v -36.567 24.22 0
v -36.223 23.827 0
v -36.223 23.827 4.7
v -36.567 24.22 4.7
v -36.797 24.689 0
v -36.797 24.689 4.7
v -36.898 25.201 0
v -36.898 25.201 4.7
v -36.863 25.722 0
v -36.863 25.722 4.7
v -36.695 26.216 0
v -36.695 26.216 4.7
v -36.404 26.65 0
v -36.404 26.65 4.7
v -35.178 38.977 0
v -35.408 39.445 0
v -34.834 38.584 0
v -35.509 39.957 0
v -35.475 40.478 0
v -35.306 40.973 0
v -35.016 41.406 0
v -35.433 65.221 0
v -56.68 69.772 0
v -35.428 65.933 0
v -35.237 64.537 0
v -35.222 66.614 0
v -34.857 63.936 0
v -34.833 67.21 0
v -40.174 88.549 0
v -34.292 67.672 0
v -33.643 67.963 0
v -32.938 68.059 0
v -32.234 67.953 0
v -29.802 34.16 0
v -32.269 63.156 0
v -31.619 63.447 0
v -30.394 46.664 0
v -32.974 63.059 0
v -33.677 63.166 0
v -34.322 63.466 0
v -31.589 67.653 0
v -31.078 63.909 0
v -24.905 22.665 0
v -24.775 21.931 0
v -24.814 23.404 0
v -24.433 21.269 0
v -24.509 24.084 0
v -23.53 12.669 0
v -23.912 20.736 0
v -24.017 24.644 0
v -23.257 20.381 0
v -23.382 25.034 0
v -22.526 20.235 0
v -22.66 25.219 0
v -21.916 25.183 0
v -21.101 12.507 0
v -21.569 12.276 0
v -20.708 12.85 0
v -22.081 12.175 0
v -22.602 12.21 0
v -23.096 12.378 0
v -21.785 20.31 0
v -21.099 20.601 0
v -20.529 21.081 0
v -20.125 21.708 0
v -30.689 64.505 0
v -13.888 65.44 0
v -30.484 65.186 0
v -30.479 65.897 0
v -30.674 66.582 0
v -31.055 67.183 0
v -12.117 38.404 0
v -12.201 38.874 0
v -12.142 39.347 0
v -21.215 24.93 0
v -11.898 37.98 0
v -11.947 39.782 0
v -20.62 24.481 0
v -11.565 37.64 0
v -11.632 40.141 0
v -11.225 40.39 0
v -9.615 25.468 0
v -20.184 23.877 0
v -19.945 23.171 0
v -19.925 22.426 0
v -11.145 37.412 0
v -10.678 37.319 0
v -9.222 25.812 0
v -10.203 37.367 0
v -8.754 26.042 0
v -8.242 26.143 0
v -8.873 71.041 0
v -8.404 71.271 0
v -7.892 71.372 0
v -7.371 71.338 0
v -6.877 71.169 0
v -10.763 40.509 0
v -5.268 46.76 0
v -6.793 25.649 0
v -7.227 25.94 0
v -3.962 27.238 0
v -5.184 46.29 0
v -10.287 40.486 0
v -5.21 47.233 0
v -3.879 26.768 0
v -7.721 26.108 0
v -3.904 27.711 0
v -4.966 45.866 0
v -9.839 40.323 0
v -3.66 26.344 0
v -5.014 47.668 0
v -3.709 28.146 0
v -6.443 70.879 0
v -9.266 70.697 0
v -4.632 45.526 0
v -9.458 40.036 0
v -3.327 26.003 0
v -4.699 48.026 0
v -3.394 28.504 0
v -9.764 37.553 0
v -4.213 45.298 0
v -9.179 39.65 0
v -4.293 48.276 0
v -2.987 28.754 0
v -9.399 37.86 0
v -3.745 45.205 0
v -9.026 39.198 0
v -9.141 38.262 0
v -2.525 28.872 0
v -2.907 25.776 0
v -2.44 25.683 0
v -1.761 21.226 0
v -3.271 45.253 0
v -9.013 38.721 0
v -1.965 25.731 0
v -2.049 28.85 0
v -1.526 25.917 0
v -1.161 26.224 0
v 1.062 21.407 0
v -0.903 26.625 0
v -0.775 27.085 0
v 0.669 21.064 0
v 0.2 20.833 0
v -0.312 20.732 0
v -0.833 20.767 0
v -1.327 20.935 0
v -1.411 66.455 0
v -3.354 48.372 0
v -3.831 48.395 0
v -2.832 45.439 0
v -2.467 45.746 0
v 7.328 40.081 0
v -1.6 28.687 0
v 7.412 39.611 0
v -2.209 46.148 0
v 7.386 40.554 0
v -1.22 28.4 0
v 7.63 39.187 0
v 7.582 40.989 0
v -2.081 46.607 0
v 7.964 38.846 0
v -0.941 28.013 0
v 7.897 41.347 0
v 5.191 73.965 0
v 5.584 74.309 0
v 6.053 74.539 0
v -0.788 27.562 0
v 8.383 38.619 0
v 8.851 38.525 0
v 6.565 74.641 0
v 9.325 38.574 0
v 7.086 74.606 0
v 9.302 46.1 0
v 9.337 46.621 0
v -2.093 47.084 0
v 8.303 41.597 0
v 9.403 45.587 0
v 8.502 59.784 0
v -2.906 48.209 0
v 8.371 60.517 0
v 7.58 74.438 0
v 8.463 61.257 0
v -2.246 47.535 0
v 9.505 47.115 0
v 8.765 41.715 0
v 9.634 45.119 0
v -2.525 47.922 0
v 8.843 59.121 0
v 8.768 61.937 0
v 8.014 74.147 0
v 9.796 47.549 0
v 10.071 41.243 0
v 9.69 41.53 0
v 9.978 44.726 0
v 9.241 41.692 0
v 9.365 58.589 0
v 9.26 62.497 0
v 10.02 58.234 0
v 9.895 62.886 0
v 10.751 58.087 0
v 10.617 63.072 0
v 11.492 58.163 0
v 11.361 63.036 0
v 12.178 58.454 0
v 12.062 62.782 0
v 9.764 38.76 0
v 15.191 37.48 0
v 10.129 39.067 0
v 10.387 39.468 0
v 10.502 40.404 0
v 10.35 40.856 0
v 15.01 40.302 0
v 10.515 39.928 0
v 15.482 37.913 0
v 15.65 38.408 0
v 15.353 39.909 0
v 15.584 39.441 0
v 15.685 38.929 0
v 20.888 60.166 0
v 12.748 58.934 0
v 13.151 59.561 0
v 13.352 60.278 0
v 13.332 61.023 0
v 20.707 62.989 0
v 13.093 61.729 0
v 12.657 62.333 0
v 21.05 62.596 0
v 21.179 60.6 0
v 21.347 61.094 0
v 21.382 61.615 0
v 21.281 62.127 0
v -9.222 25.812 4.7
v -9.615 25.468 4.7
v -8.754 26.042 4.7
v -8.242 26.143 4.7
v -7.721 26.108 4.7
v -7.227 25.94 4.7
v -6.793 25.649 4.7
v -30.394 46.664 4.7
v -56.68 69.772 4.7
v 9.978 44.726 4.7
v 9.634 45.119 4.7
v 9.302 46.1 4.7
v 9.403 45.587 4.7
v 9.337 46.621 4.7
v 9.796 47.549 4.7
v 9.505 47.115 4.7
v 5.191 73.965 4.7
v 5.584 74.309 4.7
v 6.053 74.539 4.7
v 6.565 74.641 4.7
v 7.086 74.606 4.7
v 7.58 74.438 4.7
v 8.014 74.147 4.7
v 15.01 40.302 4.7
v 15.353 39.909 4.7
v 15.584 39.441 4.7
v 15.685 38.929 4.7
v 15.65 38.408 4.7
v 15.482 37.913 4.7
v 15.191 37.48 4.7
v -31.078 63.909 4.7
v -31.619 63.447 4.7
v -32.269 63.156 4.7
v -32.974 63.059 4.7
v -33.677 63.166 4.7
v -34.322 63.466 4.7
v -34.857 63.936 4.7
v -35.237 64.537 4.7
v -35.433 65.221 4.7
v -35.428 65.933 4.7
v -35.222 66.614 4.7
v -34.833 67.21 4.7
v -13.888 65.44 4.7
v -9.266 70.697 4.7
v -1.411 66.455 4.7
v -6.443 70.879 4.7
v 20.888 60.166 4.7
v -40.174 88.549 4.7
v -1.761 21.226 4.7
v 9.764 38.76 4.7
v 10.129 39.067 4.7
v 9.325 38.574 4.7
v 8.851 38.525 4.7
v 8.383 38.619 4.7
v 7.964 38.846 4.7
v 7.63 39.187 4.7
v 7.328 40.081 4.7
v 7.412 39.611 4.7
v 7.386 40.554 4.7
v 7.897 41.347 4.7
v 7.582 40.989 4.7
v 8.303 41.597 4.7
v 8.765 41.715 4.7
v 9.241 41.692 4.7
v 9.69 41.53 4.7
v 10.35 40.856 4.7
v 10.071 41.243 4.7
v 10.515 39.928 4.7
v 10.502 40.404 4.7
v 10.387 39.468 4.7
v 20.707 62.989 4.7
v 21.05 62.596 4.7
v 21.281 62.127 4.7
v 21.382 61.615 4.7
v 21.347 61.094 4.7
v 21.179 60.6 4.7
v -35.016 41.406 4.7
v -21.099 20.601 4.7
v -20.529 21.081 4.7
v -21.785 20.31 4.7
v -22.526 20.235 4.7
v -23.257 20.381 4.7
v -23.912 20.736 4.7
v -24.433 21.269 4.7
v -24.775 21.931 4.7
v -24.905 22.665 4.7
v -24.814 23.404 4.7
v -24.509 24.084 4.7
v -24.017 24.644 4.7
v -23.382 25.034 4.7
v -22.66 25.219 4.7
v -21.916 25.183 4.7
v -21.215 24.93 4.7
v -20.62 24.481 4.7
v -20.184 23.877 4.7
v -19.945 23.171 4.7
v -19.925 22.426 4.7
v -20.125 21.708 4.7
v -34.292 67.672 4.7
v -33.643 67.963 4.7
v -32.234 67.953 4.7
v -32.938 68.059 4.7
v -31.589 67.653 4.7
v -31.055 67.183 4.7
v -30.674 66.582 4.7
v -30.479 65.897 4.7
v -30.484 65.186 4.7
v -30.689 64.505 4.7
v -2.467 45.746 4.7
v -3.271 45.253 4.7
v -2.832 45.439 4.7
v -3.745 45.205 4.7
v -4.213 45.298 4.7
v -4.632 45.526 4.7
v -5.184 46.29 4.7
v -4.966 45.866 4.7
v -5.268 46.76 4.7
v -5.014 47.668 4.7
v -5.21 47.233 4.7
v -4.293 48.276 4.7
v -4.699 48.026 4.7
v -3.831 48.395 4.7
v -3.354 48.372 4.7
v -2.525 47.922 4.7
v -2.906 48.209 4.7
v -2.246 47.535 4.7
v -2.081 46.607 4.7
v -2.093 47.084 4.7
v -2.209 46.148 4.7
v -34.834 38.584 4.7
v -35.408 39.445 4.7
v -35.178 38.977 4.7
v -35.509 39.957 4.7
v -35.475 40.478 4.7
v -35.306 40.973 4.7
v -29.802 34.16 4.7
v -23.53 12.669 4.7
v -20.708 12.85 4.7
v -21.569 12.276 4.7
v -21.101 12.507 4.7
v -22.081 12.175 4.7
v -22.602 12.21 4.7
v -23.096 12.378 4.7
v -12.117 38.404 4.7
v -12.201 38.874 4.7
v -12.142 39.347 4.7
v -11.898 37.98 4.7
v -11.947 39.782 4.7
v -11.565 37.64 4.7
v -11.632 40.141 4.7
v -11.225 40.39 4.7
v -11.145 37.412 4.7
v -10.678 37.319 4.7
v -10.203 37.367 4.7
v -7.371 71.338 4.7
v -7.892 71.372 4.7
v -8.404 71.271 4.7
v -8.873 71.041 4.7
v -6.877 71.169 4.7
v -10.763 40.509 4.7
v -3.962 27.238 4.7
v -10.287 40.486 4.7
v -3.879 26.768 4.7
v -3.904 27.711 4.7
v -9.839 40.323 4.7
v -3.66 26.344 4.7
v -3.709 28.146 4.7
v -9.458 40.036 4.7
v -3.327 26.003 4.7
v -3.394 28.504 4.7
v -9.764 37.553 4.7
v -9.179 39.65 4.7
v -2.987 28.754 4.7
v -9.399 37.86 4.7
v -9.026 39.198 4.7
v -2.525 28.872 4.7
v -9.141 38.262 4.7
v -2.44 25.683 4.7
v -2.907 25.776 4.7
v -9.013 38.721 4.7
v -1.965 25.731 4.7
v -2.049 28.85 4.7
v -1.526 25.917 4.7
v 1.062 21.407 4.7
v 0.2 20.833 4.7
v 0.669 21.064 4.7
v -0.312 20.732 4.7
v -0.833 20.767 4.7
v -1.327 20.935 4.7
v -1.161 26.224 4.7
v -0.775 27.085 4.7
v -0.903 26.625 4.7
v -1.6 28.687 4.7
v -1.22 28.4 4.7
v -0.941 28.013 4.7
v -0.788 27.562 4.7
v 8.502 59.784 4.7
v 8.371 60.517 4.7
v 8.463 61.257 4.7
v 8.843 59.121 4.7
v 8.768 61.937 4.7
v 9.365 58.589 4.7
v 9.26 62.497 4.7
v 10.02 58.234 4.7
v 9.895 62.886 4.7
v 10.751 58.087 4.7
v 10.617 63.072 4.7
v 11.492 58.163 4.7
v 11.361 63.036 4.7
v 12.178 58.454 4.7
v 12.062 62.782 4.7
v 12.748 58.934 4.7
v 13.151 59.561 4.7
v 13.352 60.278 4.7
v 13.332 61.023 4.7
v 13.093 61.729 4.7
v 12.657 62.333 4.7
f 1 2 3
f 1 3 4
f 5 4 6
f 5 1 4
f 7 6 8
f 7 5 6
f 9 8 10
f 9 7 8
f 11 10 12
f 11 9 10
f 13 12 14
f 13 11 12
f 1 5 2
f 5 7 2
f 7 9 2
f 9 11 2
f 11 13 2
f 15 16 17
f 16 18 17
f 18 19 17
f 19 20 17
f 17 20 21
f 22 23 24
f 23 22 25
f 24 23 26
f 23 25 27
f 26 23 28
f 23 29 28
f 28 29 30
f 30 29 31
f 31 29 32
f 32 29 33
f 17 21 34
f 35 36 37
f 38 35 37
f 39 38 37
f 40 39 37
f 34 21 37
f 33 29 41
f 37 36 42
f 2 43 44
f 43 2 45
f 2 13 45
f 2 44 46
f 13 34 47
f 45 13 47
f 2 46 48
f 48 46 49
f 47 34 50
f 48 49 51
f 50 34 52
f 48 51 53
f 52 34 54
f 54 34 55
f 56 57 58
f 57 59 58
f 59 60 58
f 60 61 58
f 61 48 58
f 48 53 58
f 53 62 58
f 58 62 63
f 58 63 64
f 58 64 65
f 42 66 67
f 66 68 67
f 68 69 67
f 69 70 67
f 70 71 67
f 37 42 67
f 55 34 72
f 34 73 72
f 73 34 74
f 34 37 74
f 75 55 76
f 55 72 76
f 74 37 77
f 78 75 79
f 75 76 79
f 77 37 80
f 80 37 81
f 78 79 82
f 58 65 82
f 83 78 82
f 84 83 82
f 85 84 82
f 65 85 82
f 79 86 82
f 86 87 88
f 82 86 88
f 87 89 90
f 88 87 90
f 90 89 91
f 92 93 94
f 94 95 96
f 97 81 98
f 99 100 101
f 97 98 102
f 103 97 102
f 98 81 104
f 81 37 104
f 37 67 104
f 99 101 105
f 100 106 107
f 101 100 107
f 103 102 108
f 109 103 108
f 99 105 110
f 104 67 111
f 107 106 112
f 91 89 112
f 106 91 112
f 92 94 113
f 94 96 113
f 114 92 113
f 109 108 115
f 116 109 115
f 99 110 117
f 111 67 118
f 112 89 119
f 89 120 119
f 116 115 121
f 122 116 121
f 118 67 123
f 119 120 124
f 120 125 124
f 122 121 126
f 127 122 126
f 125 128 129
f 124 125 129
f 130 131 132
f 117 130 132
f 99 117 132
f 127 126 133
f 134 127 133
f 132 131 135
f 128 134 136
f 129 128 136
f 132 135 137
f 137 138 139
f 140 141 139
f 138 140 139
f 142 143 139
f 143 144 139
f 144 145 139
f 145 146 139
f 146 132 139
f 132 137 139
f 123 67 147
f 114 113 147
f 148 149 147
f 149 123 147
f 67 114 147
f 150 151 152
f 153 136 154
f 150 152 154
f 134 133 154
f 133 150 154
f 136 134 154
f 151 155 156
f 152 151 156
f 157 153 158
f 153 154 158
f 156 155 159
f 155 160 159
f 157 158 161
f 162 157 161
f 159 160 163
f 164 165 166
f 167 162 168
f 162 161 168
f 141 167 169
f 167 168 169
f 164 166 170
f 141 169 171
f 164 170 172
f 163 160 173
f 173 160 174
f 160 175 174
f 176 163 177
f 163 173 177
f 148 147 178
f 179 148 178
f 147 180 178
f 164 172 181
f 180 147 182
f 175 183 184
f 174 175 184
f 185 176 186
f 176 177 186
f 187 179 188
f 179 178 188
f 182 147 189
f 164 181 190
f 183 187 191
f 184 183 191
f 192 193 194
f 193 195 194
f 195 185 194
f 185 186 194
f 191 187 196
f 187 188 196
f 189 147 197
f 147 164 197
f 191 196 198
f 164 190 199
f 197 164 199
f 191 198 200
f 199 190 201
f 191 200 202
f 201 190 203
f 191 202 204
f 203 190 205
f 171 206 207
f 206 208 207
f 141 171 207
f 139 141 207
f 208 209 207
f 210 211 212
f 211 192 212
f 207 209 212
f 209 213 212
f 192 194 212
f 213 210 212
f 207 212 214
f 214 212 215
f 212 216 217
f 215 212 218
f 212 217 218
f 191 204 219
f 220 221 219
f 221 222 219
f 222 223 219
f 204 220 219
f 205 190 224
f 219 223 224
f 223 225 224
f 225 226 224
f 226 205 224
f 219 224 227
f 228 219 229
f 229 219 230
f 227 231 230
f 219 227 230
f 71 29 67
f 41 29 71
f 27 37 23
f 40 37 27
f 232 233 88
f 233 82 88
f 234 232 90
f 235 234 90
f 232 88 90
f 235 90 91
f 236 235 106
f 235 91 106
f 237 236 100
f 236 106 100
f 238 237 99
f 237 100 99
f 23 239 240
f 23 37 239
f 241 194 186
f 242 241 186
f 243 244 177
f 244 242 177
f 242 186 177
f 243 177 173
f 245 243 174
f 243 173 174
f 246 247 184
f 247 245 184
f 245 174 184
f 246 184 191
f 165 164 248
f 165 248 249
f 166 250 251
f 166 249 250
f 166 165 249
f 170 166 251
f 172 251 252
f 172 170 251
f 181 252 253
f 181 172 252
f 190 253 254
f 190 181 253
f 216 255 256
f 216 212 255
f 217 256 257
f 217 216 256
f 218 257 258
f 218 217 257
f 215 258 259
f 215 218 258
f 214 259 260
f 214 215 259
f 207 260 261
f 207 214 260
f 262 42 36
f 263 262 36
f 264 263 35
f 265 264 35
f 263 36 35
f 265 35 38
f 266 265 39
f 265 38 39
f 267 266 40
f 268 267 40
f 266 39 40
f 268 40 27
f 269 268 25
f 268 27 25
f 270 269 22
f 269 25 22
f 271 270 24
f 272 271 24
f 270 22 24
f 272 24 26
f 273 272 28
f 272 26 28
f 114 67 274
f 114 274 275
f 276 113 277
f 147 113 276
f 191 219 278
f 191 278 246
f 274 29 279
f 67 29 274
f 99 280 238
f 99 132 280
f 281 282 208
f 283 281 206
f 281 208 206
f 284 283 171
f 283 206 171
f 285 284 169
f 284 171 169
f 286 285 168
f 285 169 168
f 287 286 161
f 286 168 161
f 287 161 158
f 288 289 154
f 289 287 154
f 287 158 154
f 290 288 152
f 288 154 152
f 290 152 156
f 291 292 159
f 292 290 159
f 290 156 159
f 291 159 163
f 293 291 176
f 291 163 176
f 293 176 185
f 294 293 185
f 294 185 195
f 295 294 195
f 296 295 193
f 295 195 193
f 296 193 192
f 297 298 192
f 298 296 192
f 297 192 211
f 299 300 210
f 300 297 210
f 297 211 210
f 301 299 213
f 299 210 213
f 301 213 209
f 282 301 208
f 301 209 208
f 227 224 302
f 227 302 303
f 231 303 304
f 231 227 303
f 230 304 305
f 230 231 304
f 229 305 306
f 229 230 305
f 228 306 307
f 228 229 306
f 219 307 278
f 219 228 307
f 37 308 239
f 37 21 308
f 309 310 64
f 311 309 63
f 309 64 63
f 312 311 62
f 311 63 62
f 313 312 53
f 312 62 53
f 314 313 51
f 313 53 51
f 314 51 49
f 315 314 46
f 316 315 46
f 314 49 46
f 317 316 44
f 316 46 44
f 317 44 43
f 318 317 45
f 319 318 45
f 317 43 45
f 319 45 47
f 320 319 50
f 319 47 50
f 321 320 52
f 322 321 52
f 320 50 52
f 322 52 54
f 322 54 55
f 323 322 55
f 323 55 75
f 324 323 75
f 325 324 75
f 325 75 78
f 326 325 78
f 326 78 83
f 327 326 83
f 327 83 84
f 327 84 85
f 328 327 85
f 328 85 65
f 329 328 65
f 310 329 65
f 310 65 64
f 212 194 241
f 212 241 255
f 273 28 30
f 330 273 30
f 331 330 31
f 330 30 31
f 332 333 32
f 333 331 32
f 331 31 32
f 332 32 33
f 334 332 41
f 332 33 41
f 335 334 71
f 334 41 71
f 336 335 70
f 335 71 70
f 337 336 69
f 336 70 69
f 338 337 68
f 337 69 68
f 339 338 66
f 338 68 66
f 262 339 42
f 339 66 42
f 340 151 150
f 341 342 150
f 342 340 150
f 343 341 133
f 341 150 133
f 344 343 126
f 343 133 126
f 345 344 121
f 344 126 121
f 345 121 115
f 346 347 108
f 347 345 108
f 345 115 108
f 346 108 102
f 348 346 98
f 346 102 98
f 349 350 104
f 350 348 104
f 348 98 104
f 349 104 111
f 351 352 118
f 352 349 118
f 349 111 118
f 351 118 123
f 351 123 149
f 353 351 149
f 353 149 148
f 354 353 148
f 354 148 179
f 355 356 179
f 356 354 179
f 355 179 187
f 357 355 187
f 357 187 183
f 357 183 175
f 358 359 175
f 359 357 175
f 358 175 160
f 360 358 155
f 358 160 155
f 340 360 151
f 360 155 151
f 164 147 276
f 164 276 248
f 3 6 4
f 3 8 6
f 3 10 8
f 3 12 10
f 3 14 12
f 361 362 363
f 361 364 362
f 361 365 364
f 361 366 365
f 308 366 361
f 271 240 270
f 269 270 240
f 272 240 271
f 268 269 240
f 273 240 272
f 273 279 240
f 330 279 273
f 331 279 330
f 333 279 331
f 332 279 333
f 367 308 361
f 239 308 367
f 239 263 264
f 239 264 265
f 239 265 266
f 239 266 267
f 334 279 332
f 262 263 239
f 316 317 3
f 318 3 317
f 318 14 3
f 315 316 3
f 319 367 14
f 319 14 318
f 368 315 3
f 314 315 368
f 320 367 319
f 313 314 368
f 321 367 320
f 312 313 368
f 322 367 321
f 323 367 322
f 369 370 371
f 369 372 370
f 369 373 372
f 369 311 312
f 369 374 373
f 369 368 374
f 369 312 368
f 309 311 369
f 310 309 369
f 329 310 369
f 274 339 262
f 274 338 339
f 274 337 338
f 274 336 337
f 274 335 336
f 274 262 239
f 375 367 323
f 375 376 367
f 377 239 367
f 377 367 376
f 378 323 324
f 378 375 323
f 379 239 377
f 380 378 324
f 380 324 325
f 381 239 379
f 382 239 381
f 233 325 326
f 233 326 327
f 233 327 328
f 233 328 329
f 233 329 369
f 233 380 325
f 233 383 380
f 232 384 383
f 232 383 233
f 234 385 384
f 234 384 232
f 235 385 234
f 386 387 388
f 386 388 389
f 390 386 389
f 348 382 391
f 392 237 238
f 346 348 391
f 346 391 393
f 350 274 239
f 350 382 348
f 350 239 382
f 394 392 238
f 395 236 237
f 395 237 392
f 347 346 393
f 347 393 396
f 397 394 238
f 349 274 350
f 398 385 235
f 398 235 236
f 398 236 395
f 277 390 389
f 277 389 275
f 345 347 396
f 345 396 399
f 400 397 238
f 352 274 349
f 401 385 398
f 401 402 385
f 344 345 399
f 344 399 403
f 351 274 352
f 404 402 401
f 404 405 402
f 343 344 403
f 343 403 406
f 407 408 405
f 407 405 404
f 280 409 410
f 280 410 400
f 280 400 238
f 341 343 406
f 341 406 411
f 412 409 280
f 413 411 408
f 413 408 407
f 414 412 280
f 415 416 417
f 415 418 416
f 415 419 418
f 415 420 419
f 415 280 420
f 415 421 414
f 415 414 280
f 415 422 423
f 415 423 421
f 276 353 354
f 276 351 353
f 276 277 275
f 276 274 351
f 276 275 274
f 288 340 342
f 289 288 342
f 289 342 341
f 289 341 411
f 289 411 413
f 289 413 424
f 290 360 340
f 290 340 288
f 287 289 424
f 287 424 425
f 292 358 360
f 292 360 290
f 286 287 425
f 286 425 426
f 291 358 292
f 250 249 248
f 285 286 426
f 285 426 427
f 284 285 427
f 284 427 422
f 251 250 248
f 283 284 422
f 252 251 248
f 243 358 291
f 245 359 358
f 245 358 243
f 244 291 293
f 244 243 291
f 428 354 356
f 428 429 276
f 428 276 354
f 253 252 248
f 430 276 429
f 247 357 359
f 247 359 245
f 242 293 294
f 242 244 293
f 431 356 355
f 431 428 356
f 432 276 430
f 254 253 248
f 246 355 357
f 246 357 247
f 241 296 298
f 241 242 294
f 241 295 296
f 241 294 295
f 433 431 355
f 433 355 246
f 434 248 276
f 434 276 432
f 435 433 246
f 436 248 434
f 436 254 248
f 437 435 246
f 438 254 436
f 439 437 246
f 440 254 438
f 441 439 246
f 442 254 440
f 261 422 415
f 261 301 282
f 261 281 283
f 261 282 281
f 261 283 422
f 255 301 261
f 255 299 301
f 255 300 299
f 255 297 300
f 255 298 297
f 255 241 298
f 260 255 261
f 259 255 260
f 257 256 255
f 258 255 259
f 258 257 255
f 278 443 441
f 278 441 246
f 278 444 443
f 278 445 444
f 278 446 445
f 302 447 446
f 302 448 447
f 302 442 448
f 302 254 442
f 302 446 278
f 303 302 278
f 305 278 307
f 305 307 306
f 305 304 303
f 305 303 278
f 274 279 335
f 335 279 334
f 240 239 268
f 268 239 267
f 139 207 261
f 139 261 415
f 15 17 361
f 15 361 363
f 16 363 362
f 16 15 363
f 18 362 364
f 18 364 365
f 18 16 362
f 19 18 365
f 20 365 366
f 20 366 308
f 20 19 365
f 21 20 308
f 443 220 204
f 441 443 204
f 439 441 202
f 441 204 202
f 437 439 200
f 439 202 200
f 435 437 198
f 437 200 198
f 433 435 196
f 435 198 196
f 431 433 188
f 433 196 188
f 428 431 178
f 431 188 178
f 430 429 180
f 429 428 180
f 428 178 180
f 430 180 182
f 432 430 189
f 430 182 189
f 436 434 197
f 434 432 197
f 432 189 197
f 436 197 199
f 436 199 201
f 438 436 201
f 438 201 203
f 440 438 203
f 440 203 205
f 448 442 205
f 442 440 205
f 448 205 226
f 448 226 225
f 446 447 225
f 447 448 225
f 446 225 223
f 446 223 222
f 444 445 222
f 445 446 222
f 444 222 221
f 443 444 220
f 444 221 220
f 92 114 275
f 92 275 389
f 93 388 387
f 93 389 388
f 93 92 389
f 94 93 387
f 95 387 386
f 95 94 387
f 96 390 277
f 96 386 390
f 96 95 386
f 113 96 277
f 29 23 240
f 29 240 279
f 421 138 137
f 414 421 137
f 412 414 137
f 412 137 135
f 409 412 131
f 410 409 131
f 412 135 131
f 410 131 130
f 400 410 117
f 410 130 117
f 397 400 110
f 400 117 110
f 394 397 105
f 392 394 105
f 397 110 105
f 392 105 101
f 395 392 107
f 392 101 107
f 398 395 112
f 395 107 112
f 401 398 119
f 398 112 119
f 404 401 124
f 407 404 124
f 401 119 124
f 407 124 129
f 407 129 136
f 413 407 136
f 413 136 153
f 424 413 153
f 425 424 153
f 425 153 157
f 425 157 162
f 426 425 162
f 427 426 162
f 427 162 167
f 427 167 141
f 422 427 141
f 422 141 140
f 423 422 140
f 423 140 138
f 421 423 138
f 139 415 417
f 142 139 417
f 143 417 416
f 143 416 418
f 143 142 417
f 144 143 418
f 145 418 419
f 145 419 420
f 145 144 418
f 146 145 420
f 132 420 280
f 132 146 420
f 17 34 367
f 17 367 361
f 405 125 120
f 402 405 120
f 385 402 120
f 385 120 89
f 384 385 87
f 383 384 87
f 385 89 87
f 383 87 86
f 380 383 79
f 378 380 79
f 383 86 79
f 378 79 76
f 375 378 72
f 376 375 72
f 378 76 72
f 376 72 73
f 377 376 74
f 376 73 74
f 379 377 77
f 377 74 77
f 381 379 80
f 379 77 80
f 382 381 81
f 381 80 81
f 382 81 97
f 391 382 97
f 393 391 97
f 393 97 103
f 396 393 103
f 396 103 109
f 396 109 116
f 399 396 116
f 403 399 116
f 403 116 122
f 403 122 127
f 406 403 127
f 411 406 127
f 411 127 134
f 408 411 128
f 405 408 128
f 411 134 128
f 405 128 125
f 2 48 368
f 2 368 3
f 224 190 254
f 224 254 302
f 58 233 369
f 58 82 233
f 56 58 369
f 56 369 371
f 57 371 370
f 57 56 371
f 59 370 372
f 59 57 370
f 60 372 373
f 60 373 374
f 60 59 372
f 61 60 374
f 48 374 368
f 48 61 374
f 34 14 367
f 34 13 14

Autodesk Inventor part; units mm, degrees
ref_plane "YZ Plane" through (0, 0, 0) normal (1, 0, 0) x (0, 1, 0)
ref_plane "XZ Plane" through (0, 0, 0) normal (0, 1, 0) x (-1, 0, 0)
ref_plane "XY Plane" through (0, 0, 0) normal (0, 0, 1) x (1, 0, 0)
ref_plane "Work Plane1" through (-54.8706, 13.9436, 0) normal (0, 0, 1) x (0.7510442, -0.660252, 0)
sketch "Sketch1" plane through (-54.8706, 13.9436, 0) normal (0, 0, 1) x (0.7510442, -0.660252, 0)
  line L0 (-38.2203, 53.235) -> (-38.2203, 65.735)
  line L1 (-38.2203, 65.735) -> (-3.2203, 65.735)
  line L2 (-3.2203, 65.735) -> (-3.2203, 72.735)
  line L3 (-1.2203, 74.735) -> (5.4797, 74.735)
  line L4 (5.4797, 74.735) -> (5.4797, 84.735)
  line L5 (7.4797, 86.735) -> (24.3797, 86.735)
  line L6 (26.3797, 84.735) -> (26.3797, 67.935)
  line L7 (28.3797, 65.935) -> (35.0797, 65.935)
  line L8 (37.0797, 63.935) -> (37.0797, 53.235)
  arc A0 (37.0797, 63.935) -> (35.0797, 65.935) centre (35.0797, 63.935) ccw
  arc A1 (26.3797, 67.935) -> (28.3797, 65.935) centre (28.3797, 67.935) ccw
  arc A2 (26.3797, 84.735) -> (24.3797, 86.735) centre (24.3797, 84.735) ccw
  arc A3 (7.4797, 86.735) -> (5.4797, 84.735) centre (7.4797, 84.735) ccw
  arc A4 (-1.2203, 74.735) -> (-3.2203, 72.735) centre (-1.2203, 72.735) ccw
  circle A5 centre (30.6297, 61.785) radius 1.6
  circle A6 centre (16.7597, 58.485) radius 1.6
  circle A7 centre (18.5797, 78.435) radius 2.5
  circle A8 centre (-17.6203, 53.235) radius 2.5
  line L9 (37.0797, 53.235) -> (-15.1203, 53.235)
  line L10 (-20.1203, 53.235) -> (-38.2203, 53.235)
  point P0 (50.4165, 25.7562)
  dimension "d1" = 35
  dimension "d2" = 9
  dimension "d3" = 8.7
  dimension "d4" = 12
  dimension "d5" = 20.9
  dimension "d6" = 20.8
  dimension "d7" = 10.7
  dimension "d8" = 2
  dimension "d9" = 3.2
  dimension "d10" = 3.2
  dimension "d11" = 5
  dimension "d12" = 5
  dimension "d13" = 20.6
  dimension "d14" = 7.8
  dimension "d15" = 8.3
  dimension "d16" = 4.15
  dimension "d17" = 6.45
  dimension "d18" = 20.32
extrude "Extrusion1" add sketch "Sketch1" along normal blind 4.7 contours L0 L1 L2 A4 L3 L4 A3 L5 A2 L6 A1 L7 A0 L8 L9 A8 L10
mirror "Mirror1" about plane through (-31.078, 63.9086, 0) normal (-0.660252, -0.7510442, 0) of "Extrusion1"
properties part number "Neje_Base_Slide_y"
